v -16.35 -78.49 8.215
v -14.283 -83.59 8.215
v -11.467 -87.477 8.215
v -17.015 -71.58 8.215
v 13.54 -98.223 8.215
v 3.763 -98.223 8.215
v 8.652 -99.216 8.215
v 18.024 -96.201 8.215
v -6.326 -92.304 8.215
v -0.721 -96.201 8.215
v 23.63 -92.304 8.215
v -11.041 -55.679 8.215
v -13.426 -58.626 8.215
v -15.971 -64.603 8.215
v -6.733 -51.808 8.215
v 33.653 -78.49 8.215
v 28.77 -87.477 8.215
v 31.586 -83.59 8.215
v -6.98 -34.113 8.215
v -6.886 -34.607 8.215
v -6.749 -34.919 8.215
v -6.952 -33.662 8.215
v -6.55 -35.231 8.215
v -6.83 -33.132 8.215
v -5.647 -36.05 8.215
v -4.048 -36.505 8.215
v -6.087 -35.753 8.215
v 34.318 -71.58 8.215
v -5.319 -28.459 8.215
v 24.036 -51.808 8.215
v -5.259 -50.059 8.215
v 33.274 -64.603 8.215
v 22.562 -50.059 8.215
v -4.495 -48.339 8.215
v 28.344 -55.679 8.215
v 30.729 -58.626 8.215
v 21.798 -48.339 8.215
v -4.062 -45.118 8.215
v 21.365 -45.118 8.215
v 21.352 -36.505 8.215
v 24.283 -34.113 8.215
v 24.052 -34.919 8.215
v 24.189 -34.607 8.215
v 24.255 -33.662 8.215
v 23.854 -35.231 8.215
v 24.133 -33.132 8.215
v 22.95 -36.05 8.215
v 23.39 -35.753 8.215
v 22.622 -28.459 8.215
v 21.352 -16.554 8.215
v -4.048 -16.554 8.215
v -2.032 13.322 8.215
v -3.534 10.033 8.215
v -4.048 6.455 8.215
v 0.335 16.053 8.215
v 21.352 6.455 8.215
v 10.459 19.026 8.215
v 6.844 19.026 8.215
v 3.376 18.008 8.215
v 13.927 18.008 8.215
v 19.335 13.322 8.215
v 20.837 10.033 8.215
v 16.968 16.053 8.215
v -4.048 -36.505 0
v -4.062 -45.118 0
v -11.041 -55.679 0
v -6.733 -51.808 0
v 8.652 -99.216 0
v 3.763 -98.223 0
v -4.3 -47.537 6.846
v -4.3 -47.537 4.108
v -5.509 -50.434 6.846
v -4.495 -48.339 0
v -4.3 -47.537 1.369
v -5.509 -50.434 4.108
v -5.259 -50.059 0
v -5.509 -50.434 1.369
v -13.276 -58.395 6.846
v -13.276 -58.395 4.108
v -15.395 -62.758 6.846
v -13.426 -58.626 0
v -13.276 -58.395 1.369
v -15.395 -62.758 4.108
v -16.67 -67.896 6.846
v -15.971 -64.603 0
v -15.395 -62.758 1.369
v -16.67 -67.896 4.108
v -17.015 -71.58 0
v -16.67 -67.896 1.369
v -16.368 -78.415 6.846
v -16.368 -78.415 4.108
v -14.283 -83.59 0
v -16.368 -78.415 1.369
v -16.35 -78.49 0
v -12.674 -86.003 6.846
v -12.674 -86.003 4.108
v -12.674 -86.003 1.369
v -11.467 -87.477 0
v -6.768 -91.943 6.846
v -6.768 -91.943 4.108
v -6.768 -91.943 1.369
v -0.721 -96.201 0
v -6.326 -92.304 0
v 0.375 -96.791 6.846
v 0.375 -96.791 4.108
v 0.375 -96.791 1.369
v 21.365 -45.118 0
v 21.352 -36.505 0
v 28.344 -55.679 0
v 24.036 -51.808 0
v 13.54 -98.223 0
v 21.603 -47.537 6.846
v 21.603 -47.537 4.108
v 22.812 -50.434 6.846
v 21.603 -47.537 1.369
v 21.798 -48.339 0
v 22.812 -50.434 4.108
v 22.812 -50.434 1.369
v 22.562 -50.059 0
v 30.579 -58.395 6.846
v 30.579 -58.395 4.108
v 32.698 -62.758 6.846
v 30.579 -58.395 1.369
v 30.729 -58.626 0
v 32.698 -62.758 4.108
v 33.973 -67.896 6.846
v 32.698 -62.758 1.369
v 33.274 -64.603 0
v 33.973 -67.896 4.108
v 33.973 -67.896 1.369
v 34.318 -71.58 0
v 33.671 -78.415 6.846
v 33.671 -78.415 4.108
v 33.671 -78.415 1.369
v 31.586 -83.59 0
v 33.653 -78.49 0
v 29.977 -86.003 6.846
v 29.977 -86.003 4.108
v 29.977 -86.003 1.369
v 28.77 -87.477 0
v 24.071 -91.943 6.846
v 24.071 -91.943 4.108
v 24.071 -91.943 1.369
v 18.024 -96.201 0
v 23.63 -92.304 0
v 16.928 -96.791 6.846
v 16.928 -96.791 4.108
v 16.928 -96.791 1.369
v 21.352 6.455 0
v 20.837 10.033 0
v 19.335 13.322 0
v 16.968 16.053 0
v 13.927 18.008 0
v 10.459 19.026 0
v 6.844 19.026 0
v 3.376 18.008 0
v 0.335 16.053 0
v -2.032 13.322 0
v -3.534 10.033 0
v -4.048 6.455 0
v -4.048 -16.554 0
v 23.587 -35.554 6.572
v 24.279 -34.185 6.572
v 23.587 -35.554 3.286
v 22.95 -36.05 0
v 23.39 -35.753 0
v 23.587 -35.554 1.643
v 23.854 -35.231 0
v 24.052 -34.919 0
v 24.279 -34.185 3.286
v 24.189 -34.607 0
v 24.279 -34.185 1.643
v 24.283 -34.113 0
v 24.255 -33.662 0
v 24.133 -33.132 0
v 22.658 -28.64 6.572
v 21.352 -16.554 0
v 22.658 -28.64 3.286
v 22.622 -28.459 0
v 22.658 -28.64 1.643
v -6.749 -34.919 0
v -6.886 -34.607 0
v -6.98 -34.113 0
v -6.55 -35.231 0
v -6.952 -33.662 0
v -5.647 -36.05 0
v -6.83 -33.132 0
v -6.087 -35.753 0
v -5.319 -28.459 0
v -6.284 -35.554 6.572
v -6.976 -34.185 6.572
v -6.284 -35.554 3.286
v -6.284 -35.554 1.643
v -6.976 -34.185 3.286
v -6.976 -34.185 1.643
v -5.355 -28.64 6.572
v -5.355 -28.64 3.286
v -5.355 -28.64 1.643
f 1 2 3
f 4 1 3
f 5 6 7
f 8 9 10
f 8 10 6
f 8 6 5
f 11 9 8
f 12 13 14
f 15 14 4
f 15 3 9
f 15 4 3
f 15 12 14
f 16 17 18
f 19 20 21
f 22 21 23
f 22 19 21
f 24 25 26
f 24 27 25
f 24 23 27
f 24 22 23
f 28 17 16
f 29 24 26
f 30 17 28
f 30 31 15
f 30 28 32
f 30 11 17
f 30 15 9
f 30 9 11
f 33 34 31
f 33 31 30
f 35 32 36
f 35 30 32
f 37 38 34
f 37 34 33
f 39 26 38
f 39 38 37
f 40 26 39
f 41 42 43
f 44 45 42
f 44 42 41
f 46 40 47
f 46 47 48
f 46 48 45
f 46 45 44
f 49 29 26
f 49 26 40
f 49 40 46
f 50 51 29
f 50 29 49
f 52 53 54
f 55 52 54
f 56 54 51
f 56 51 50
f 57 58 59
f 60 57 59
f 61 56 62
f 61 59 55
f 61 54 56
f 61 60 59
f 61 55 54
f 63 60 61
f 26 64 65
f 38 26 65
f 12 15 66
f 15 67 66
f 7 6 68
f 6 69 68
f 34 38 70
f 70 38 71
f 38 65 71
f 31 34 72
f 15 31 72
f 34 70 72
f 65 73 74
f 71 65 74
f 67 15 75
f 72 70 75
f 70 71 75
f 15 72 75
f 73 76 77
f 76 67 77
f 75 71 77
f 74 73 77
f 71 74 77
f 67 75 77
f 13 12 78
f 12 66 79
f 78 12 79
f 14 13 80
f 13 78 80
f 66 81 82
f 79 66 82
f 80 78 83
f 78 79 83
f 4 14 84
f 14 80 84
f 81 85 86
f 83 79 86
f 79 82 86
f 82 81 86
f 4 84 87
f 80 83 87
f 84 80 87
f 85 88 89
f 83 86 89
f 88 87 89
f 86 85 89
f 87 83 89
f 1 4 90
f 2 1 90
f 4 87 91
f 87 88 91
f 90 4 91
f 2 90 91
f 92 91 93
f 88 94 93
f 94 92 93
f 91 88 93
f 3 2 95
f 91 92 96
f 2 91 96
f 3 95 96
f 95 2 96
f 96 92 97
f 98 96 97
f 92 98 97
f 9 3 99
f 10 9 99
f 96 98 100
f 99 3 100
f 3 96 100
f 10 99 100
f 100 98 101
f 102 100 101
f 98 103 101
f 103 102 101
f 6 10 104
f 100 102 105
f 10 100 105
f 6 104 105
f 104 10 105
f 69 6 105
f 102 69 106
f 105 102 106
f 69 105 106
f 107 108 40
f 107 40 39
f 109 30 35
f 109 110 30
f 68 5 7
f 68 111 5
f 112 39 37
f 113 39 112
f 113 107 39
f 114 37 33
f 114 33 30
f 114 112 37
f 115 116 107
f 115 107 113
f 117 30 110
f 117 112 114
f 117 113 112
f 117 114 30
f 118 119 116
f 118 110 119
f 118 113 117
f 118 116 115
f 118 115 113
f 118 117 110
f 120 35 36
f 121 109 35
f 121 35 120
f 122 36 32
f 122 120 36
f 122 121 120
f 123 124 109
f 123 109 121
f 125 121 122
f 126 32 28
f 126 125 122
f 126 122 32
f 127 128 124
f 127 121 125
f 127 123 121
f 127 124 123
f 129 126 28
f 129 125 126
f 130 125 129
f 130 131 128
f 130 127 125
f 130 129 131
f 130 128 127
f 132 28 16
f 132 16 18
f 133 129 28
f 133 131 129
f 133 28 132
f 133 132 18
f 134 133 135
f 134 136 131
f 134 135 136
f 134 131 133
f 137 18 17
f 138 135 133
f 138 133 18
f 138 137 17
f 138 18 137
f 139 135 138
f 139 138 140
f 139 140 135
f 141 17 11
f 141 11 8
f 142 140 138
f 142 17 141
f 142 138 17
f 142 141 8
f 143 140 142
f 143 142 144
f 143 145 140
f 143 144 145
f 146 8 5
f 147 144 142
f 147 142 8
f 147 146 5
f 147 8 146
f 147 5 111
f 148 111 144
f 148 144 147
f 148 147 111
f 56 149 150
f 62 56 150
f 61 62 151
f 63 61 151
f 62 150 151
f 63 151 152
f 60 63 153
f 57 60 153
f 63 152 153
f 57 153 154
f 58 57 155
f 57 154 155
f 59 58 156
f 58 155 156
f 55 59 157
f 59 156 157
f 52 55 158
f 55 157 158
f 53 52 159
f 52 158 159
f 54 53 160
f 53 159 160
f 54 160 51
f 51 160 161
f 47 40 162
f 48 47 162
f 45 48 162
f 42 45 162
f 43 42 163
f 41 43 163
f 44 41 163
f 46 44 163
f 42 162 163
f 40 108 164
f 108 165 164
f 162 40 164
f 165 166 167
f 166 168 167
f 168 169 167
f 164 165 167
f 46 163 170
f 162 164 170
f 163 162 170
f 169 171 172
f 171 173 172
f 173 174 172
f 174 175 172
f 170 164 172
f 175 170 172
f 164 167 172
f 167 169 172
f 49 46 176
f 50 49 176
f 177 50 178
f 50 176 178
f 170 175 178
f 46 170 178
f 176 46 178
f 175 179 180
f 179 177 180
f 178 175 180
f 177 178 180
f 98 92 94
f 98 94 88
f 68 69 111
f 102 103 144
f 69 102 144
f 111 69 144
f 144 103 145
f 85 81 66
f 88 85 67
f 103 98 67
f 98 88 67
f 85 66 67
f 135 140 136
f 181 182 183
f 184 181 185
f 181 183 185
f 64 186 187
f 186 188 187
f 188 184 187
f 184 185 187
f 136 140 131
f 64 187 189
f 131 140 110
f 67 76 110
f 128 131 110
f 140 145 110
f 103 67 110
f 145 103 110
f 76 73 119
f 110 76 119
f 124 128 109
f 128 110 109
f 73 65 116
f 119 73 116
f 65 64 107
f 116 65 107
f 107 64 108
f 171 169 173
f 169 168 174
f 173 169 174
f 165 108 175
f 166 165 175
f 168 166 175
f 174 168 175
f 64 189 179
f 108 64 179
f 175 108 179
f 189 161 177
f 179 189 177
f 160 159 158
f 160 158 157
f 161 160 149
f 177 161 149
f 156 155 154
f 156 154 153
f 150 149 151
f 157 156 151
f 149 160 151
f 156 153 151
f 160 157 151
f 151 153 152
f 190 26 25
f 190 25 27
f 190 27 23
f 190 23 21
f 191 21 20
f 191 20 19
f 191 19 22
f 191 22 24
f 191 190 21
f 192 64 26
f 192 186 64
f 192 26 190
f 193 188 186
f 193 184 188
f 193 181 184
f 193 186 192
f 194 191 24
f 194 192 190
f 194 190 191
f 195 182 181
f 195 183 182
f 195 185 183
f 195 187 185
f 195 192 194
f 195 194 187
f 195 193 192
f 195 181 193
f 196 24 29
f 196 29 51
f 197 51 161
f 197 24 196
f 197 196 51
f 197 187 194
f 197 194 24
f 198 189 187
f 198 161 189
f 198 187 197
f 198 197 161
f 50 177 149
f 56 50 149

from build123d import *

# Parameters (mm, degrees)
F1_DEPTH = 8.21504


with BuildPart() as f1:
    # F0 (on Top) → F1 (new body)
    with BuildSketch(Plane.XY):
        with BuildLine():
            Line((-3.3034197986, -34.1845839397), (-4.0484705612, -34.1845839397))
            Line((-4.0484705612, -34.1845839397), (-4.0484705612, -16.5537446737))
            add(Edge.make_bspline(
                [(-4.0484705612, -36.5049652755), (-5.5591903136, -36.2094730067), (-6.1670200282, -35.7941111545), (-7.3639816279, -34.16591861), (-6.146083559, -31.4518946968), (-5.1461923542, -28.7361235287), (-4.0484705612, -19.998550415), (-4.0484705612, -16.5537446737)],
                knots=[0, 0, 0, 0, 0.1610437165, 0.2890441344, 0.4548154481, 0.6397343322, 1, 1, 1, 1], degree=3))
            add(Edge.make_bspline(
                [(-3.3034197986, -34.1845839397), (-3.7231982882, -34.7388008216), (-3.9452111146, -35.4318249037), (-4.0484705612, -36.5049652755)],
                knots=[0, 0, 0, 0, 0.0681597552, 0.0681597552, 0.0681597552, 0.0681597552], degree=3))
        make_face()
        with BuildLine():
            Line((-4.0484705612, -16.5537446737), (-4.0484705612, -34.1845839397))
            Line((-4.0484705612, -34.1845839397), (-3.3034197986, -34.1845839397))
            add(Edge.make_bspline(
                [(-3.3034197986, -34.1845839397), (-3.7231982882, -34.7388008216), (-3.9452111146, -35.4318249037), (-4.0484705612, -36.5049652755)],
                knots=[0, 0, 0, 0, 0.0681597552, 0.0681597552, 0.0681597552, 0.0681597552], degree=3))
            add(Edge.make_bspline(
                [(-4.0484705612, -36.5049652755), (-4.2313706576, -38.4057838825), (-3.8674804038, -44.3404226867), (-4.4524409123, -51.3588376939), (-15.6508327782, -57.1495224389), (-19.1373936488, -79.7020540979), (-7.2949213642, -92.4799412248), (2.7018639336, -98.7805787887), (8.6515294388, -99.2159172893)],
                knots=[0.0681597552, 0.0681597552, 0.0681597552, 0.0681597552, 0.1888889109, 0.2997773957, 0.4453863347, 0.641896656, 0.8197243688, 1, 1, 1, 1], degree=3))
            add(Edge.make_bspline(
                [(21.3515294388, -36.5049652755), (21.5344295352, -38.4057838825), (21.1705392814, -44.3404226867), (21.7554997898, -51.3588376939), (32.9538916558, -57.1495224389), (36.4404525264, -79.7020540979), (24.5979802418, -92.4799412248), (14.601194944, -98.7805787887), (8.6515294388, -99.2159172893)],
                knots=[0.0681597552, 0.0681597552, 0.0681597552, 0.0681597552, 0.1888889109, 0.2997773957, 0.4453863347, 0.641896656, 0.8197243688, 1, 1, 1, 1], degree=3))
            add(Edge.make_bspline(
                [(20.6064786762, -34.1845839397), (21.0262571658, -34.7388008216), (21.2482699922, -35.4318249037), (21.3515294388, -36.5049652755)],
                knots=[0, 0, 0, 0, 0.0681597552, 0.0681597552, 0.0681597552, 0.0681597552], degree=3))
            Line((20.6064786762, -34.1845839397), (21.3515294388, -34.1845839397))
            Line((21.3515294388, -34.1845839397), (21.3515294388, -16.5537446737))
            Line((21.3515294388, -16.5537446737), (21.3515294388, 6.4554160603))
            ThreePointArc((21.3515294388, 6.4554160603), (8.6515294388, 19.1554160603), (-4.0484705612, 6.4554160603))
            Line((-4.0484705612, 6.4554160603), (-4.0484705612, -16.5537446737))
        make_face()
        with BuildLine():
            add(Edge.make_bspline(
                [(20.6064786762, -34.1845839397), (21.0262571658, -34.7388008216), (21.2482699922, -35.4318249037), (21.3515294388, -36.5049652755)],
                knots=[0, 0, 0, 0, 0.0681597552, 0.0681597552, 0.0681597552, 0.0681597552], degree=3))
            add(Edge.make_bspline(
                [(21.3515294388, -36.5049652755), (22.8622491912, -36.2094730067), (23.4700789058, -35.7941111545), (24.6670405055, -34.16591861), (23.4491424366, -31.4518946968), (22.4492512318, -28.7361235287), (21.3515294388, -19.998550415), (21.3515294388, -16.5537446737)],
                knots=[0, 0, 0, 0, 0.1610437165, 0.2890441344, 0.4548154481, 0.6397343322, 1, 1, 1, 1], degree=3))
            Line((21.3515294388, -16.5537446737), (21.3515294388, -34.1845839397))
            Line((21.3515294388, -34.1845839397), (20.6064786762, -34.1845839397))
        make_face()
    extrude(amount=F1_DEPTH)


solid = f1.part
